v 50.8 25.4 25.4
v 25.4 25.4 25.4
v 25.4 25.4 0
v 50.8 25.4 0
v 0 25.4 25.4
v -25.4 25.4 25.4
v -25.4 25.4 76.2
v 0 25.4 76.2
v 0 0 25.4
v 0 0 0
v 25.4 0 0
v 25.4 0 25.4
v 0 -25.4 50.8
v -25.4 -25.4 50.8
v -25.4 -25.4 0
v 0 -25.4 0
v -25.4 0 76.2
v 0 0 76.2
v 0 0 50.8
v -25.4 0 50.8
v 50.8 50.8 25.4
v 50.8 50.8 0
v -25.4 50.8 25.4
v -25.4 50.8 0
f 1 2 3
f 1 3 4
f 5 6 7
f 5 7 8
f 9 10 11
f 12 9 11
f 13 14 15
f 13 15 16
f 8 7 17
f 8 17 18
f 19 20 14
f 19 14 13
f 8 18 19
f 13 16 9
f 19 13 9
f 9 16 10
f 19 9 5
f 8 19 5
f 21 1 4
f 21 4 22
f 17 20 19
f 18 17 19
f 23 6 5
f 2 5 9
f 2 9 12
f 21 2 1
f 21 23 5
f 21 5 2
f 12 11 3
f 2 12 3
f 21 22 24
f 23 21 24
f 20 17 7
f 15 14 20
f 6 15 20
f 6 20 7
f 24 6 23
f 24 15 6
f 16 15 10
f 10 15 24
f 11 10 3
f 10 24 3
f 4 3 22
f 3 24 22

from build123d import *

# Parameters (mm, degrees)
F1_DEPTH = 25.4
F0_W     = 25.4
F0_H     = 25.4
F2_DEPTH = 76.2
F3_DEPTH = 50.8


with BuildPart() as f1:
    # F0 (on Top) → F1 (new body)
    with BuildSketch(Plane.XY):
        Polygon((0, 25.4), (0, 0), (25.4, 0), (25.4, 25.4), (50.8, 25.4), (50.8, 50.8), (-25.4, 50.8), (-25.4, 25.4), align=None)
    extrude(amount=F1_DEPTH)

    # F0 (on Top) → F2 (join)
    with BuildSketch(Plane.XY):
        with Locations((-12.7, 12.7)):
            Rectangle(F0_W, F0_H)
    extrude(amount=F2_DEPTH)

    # F0 (on Top) → F3 (join)
    with BuildSketch(Plane.XY):
        with Locations((-12.7, -12.7)):
            Rectangle(F0_W, F0_H)
    extrude(amount=F3_DEPTH)


solid = f1.part
